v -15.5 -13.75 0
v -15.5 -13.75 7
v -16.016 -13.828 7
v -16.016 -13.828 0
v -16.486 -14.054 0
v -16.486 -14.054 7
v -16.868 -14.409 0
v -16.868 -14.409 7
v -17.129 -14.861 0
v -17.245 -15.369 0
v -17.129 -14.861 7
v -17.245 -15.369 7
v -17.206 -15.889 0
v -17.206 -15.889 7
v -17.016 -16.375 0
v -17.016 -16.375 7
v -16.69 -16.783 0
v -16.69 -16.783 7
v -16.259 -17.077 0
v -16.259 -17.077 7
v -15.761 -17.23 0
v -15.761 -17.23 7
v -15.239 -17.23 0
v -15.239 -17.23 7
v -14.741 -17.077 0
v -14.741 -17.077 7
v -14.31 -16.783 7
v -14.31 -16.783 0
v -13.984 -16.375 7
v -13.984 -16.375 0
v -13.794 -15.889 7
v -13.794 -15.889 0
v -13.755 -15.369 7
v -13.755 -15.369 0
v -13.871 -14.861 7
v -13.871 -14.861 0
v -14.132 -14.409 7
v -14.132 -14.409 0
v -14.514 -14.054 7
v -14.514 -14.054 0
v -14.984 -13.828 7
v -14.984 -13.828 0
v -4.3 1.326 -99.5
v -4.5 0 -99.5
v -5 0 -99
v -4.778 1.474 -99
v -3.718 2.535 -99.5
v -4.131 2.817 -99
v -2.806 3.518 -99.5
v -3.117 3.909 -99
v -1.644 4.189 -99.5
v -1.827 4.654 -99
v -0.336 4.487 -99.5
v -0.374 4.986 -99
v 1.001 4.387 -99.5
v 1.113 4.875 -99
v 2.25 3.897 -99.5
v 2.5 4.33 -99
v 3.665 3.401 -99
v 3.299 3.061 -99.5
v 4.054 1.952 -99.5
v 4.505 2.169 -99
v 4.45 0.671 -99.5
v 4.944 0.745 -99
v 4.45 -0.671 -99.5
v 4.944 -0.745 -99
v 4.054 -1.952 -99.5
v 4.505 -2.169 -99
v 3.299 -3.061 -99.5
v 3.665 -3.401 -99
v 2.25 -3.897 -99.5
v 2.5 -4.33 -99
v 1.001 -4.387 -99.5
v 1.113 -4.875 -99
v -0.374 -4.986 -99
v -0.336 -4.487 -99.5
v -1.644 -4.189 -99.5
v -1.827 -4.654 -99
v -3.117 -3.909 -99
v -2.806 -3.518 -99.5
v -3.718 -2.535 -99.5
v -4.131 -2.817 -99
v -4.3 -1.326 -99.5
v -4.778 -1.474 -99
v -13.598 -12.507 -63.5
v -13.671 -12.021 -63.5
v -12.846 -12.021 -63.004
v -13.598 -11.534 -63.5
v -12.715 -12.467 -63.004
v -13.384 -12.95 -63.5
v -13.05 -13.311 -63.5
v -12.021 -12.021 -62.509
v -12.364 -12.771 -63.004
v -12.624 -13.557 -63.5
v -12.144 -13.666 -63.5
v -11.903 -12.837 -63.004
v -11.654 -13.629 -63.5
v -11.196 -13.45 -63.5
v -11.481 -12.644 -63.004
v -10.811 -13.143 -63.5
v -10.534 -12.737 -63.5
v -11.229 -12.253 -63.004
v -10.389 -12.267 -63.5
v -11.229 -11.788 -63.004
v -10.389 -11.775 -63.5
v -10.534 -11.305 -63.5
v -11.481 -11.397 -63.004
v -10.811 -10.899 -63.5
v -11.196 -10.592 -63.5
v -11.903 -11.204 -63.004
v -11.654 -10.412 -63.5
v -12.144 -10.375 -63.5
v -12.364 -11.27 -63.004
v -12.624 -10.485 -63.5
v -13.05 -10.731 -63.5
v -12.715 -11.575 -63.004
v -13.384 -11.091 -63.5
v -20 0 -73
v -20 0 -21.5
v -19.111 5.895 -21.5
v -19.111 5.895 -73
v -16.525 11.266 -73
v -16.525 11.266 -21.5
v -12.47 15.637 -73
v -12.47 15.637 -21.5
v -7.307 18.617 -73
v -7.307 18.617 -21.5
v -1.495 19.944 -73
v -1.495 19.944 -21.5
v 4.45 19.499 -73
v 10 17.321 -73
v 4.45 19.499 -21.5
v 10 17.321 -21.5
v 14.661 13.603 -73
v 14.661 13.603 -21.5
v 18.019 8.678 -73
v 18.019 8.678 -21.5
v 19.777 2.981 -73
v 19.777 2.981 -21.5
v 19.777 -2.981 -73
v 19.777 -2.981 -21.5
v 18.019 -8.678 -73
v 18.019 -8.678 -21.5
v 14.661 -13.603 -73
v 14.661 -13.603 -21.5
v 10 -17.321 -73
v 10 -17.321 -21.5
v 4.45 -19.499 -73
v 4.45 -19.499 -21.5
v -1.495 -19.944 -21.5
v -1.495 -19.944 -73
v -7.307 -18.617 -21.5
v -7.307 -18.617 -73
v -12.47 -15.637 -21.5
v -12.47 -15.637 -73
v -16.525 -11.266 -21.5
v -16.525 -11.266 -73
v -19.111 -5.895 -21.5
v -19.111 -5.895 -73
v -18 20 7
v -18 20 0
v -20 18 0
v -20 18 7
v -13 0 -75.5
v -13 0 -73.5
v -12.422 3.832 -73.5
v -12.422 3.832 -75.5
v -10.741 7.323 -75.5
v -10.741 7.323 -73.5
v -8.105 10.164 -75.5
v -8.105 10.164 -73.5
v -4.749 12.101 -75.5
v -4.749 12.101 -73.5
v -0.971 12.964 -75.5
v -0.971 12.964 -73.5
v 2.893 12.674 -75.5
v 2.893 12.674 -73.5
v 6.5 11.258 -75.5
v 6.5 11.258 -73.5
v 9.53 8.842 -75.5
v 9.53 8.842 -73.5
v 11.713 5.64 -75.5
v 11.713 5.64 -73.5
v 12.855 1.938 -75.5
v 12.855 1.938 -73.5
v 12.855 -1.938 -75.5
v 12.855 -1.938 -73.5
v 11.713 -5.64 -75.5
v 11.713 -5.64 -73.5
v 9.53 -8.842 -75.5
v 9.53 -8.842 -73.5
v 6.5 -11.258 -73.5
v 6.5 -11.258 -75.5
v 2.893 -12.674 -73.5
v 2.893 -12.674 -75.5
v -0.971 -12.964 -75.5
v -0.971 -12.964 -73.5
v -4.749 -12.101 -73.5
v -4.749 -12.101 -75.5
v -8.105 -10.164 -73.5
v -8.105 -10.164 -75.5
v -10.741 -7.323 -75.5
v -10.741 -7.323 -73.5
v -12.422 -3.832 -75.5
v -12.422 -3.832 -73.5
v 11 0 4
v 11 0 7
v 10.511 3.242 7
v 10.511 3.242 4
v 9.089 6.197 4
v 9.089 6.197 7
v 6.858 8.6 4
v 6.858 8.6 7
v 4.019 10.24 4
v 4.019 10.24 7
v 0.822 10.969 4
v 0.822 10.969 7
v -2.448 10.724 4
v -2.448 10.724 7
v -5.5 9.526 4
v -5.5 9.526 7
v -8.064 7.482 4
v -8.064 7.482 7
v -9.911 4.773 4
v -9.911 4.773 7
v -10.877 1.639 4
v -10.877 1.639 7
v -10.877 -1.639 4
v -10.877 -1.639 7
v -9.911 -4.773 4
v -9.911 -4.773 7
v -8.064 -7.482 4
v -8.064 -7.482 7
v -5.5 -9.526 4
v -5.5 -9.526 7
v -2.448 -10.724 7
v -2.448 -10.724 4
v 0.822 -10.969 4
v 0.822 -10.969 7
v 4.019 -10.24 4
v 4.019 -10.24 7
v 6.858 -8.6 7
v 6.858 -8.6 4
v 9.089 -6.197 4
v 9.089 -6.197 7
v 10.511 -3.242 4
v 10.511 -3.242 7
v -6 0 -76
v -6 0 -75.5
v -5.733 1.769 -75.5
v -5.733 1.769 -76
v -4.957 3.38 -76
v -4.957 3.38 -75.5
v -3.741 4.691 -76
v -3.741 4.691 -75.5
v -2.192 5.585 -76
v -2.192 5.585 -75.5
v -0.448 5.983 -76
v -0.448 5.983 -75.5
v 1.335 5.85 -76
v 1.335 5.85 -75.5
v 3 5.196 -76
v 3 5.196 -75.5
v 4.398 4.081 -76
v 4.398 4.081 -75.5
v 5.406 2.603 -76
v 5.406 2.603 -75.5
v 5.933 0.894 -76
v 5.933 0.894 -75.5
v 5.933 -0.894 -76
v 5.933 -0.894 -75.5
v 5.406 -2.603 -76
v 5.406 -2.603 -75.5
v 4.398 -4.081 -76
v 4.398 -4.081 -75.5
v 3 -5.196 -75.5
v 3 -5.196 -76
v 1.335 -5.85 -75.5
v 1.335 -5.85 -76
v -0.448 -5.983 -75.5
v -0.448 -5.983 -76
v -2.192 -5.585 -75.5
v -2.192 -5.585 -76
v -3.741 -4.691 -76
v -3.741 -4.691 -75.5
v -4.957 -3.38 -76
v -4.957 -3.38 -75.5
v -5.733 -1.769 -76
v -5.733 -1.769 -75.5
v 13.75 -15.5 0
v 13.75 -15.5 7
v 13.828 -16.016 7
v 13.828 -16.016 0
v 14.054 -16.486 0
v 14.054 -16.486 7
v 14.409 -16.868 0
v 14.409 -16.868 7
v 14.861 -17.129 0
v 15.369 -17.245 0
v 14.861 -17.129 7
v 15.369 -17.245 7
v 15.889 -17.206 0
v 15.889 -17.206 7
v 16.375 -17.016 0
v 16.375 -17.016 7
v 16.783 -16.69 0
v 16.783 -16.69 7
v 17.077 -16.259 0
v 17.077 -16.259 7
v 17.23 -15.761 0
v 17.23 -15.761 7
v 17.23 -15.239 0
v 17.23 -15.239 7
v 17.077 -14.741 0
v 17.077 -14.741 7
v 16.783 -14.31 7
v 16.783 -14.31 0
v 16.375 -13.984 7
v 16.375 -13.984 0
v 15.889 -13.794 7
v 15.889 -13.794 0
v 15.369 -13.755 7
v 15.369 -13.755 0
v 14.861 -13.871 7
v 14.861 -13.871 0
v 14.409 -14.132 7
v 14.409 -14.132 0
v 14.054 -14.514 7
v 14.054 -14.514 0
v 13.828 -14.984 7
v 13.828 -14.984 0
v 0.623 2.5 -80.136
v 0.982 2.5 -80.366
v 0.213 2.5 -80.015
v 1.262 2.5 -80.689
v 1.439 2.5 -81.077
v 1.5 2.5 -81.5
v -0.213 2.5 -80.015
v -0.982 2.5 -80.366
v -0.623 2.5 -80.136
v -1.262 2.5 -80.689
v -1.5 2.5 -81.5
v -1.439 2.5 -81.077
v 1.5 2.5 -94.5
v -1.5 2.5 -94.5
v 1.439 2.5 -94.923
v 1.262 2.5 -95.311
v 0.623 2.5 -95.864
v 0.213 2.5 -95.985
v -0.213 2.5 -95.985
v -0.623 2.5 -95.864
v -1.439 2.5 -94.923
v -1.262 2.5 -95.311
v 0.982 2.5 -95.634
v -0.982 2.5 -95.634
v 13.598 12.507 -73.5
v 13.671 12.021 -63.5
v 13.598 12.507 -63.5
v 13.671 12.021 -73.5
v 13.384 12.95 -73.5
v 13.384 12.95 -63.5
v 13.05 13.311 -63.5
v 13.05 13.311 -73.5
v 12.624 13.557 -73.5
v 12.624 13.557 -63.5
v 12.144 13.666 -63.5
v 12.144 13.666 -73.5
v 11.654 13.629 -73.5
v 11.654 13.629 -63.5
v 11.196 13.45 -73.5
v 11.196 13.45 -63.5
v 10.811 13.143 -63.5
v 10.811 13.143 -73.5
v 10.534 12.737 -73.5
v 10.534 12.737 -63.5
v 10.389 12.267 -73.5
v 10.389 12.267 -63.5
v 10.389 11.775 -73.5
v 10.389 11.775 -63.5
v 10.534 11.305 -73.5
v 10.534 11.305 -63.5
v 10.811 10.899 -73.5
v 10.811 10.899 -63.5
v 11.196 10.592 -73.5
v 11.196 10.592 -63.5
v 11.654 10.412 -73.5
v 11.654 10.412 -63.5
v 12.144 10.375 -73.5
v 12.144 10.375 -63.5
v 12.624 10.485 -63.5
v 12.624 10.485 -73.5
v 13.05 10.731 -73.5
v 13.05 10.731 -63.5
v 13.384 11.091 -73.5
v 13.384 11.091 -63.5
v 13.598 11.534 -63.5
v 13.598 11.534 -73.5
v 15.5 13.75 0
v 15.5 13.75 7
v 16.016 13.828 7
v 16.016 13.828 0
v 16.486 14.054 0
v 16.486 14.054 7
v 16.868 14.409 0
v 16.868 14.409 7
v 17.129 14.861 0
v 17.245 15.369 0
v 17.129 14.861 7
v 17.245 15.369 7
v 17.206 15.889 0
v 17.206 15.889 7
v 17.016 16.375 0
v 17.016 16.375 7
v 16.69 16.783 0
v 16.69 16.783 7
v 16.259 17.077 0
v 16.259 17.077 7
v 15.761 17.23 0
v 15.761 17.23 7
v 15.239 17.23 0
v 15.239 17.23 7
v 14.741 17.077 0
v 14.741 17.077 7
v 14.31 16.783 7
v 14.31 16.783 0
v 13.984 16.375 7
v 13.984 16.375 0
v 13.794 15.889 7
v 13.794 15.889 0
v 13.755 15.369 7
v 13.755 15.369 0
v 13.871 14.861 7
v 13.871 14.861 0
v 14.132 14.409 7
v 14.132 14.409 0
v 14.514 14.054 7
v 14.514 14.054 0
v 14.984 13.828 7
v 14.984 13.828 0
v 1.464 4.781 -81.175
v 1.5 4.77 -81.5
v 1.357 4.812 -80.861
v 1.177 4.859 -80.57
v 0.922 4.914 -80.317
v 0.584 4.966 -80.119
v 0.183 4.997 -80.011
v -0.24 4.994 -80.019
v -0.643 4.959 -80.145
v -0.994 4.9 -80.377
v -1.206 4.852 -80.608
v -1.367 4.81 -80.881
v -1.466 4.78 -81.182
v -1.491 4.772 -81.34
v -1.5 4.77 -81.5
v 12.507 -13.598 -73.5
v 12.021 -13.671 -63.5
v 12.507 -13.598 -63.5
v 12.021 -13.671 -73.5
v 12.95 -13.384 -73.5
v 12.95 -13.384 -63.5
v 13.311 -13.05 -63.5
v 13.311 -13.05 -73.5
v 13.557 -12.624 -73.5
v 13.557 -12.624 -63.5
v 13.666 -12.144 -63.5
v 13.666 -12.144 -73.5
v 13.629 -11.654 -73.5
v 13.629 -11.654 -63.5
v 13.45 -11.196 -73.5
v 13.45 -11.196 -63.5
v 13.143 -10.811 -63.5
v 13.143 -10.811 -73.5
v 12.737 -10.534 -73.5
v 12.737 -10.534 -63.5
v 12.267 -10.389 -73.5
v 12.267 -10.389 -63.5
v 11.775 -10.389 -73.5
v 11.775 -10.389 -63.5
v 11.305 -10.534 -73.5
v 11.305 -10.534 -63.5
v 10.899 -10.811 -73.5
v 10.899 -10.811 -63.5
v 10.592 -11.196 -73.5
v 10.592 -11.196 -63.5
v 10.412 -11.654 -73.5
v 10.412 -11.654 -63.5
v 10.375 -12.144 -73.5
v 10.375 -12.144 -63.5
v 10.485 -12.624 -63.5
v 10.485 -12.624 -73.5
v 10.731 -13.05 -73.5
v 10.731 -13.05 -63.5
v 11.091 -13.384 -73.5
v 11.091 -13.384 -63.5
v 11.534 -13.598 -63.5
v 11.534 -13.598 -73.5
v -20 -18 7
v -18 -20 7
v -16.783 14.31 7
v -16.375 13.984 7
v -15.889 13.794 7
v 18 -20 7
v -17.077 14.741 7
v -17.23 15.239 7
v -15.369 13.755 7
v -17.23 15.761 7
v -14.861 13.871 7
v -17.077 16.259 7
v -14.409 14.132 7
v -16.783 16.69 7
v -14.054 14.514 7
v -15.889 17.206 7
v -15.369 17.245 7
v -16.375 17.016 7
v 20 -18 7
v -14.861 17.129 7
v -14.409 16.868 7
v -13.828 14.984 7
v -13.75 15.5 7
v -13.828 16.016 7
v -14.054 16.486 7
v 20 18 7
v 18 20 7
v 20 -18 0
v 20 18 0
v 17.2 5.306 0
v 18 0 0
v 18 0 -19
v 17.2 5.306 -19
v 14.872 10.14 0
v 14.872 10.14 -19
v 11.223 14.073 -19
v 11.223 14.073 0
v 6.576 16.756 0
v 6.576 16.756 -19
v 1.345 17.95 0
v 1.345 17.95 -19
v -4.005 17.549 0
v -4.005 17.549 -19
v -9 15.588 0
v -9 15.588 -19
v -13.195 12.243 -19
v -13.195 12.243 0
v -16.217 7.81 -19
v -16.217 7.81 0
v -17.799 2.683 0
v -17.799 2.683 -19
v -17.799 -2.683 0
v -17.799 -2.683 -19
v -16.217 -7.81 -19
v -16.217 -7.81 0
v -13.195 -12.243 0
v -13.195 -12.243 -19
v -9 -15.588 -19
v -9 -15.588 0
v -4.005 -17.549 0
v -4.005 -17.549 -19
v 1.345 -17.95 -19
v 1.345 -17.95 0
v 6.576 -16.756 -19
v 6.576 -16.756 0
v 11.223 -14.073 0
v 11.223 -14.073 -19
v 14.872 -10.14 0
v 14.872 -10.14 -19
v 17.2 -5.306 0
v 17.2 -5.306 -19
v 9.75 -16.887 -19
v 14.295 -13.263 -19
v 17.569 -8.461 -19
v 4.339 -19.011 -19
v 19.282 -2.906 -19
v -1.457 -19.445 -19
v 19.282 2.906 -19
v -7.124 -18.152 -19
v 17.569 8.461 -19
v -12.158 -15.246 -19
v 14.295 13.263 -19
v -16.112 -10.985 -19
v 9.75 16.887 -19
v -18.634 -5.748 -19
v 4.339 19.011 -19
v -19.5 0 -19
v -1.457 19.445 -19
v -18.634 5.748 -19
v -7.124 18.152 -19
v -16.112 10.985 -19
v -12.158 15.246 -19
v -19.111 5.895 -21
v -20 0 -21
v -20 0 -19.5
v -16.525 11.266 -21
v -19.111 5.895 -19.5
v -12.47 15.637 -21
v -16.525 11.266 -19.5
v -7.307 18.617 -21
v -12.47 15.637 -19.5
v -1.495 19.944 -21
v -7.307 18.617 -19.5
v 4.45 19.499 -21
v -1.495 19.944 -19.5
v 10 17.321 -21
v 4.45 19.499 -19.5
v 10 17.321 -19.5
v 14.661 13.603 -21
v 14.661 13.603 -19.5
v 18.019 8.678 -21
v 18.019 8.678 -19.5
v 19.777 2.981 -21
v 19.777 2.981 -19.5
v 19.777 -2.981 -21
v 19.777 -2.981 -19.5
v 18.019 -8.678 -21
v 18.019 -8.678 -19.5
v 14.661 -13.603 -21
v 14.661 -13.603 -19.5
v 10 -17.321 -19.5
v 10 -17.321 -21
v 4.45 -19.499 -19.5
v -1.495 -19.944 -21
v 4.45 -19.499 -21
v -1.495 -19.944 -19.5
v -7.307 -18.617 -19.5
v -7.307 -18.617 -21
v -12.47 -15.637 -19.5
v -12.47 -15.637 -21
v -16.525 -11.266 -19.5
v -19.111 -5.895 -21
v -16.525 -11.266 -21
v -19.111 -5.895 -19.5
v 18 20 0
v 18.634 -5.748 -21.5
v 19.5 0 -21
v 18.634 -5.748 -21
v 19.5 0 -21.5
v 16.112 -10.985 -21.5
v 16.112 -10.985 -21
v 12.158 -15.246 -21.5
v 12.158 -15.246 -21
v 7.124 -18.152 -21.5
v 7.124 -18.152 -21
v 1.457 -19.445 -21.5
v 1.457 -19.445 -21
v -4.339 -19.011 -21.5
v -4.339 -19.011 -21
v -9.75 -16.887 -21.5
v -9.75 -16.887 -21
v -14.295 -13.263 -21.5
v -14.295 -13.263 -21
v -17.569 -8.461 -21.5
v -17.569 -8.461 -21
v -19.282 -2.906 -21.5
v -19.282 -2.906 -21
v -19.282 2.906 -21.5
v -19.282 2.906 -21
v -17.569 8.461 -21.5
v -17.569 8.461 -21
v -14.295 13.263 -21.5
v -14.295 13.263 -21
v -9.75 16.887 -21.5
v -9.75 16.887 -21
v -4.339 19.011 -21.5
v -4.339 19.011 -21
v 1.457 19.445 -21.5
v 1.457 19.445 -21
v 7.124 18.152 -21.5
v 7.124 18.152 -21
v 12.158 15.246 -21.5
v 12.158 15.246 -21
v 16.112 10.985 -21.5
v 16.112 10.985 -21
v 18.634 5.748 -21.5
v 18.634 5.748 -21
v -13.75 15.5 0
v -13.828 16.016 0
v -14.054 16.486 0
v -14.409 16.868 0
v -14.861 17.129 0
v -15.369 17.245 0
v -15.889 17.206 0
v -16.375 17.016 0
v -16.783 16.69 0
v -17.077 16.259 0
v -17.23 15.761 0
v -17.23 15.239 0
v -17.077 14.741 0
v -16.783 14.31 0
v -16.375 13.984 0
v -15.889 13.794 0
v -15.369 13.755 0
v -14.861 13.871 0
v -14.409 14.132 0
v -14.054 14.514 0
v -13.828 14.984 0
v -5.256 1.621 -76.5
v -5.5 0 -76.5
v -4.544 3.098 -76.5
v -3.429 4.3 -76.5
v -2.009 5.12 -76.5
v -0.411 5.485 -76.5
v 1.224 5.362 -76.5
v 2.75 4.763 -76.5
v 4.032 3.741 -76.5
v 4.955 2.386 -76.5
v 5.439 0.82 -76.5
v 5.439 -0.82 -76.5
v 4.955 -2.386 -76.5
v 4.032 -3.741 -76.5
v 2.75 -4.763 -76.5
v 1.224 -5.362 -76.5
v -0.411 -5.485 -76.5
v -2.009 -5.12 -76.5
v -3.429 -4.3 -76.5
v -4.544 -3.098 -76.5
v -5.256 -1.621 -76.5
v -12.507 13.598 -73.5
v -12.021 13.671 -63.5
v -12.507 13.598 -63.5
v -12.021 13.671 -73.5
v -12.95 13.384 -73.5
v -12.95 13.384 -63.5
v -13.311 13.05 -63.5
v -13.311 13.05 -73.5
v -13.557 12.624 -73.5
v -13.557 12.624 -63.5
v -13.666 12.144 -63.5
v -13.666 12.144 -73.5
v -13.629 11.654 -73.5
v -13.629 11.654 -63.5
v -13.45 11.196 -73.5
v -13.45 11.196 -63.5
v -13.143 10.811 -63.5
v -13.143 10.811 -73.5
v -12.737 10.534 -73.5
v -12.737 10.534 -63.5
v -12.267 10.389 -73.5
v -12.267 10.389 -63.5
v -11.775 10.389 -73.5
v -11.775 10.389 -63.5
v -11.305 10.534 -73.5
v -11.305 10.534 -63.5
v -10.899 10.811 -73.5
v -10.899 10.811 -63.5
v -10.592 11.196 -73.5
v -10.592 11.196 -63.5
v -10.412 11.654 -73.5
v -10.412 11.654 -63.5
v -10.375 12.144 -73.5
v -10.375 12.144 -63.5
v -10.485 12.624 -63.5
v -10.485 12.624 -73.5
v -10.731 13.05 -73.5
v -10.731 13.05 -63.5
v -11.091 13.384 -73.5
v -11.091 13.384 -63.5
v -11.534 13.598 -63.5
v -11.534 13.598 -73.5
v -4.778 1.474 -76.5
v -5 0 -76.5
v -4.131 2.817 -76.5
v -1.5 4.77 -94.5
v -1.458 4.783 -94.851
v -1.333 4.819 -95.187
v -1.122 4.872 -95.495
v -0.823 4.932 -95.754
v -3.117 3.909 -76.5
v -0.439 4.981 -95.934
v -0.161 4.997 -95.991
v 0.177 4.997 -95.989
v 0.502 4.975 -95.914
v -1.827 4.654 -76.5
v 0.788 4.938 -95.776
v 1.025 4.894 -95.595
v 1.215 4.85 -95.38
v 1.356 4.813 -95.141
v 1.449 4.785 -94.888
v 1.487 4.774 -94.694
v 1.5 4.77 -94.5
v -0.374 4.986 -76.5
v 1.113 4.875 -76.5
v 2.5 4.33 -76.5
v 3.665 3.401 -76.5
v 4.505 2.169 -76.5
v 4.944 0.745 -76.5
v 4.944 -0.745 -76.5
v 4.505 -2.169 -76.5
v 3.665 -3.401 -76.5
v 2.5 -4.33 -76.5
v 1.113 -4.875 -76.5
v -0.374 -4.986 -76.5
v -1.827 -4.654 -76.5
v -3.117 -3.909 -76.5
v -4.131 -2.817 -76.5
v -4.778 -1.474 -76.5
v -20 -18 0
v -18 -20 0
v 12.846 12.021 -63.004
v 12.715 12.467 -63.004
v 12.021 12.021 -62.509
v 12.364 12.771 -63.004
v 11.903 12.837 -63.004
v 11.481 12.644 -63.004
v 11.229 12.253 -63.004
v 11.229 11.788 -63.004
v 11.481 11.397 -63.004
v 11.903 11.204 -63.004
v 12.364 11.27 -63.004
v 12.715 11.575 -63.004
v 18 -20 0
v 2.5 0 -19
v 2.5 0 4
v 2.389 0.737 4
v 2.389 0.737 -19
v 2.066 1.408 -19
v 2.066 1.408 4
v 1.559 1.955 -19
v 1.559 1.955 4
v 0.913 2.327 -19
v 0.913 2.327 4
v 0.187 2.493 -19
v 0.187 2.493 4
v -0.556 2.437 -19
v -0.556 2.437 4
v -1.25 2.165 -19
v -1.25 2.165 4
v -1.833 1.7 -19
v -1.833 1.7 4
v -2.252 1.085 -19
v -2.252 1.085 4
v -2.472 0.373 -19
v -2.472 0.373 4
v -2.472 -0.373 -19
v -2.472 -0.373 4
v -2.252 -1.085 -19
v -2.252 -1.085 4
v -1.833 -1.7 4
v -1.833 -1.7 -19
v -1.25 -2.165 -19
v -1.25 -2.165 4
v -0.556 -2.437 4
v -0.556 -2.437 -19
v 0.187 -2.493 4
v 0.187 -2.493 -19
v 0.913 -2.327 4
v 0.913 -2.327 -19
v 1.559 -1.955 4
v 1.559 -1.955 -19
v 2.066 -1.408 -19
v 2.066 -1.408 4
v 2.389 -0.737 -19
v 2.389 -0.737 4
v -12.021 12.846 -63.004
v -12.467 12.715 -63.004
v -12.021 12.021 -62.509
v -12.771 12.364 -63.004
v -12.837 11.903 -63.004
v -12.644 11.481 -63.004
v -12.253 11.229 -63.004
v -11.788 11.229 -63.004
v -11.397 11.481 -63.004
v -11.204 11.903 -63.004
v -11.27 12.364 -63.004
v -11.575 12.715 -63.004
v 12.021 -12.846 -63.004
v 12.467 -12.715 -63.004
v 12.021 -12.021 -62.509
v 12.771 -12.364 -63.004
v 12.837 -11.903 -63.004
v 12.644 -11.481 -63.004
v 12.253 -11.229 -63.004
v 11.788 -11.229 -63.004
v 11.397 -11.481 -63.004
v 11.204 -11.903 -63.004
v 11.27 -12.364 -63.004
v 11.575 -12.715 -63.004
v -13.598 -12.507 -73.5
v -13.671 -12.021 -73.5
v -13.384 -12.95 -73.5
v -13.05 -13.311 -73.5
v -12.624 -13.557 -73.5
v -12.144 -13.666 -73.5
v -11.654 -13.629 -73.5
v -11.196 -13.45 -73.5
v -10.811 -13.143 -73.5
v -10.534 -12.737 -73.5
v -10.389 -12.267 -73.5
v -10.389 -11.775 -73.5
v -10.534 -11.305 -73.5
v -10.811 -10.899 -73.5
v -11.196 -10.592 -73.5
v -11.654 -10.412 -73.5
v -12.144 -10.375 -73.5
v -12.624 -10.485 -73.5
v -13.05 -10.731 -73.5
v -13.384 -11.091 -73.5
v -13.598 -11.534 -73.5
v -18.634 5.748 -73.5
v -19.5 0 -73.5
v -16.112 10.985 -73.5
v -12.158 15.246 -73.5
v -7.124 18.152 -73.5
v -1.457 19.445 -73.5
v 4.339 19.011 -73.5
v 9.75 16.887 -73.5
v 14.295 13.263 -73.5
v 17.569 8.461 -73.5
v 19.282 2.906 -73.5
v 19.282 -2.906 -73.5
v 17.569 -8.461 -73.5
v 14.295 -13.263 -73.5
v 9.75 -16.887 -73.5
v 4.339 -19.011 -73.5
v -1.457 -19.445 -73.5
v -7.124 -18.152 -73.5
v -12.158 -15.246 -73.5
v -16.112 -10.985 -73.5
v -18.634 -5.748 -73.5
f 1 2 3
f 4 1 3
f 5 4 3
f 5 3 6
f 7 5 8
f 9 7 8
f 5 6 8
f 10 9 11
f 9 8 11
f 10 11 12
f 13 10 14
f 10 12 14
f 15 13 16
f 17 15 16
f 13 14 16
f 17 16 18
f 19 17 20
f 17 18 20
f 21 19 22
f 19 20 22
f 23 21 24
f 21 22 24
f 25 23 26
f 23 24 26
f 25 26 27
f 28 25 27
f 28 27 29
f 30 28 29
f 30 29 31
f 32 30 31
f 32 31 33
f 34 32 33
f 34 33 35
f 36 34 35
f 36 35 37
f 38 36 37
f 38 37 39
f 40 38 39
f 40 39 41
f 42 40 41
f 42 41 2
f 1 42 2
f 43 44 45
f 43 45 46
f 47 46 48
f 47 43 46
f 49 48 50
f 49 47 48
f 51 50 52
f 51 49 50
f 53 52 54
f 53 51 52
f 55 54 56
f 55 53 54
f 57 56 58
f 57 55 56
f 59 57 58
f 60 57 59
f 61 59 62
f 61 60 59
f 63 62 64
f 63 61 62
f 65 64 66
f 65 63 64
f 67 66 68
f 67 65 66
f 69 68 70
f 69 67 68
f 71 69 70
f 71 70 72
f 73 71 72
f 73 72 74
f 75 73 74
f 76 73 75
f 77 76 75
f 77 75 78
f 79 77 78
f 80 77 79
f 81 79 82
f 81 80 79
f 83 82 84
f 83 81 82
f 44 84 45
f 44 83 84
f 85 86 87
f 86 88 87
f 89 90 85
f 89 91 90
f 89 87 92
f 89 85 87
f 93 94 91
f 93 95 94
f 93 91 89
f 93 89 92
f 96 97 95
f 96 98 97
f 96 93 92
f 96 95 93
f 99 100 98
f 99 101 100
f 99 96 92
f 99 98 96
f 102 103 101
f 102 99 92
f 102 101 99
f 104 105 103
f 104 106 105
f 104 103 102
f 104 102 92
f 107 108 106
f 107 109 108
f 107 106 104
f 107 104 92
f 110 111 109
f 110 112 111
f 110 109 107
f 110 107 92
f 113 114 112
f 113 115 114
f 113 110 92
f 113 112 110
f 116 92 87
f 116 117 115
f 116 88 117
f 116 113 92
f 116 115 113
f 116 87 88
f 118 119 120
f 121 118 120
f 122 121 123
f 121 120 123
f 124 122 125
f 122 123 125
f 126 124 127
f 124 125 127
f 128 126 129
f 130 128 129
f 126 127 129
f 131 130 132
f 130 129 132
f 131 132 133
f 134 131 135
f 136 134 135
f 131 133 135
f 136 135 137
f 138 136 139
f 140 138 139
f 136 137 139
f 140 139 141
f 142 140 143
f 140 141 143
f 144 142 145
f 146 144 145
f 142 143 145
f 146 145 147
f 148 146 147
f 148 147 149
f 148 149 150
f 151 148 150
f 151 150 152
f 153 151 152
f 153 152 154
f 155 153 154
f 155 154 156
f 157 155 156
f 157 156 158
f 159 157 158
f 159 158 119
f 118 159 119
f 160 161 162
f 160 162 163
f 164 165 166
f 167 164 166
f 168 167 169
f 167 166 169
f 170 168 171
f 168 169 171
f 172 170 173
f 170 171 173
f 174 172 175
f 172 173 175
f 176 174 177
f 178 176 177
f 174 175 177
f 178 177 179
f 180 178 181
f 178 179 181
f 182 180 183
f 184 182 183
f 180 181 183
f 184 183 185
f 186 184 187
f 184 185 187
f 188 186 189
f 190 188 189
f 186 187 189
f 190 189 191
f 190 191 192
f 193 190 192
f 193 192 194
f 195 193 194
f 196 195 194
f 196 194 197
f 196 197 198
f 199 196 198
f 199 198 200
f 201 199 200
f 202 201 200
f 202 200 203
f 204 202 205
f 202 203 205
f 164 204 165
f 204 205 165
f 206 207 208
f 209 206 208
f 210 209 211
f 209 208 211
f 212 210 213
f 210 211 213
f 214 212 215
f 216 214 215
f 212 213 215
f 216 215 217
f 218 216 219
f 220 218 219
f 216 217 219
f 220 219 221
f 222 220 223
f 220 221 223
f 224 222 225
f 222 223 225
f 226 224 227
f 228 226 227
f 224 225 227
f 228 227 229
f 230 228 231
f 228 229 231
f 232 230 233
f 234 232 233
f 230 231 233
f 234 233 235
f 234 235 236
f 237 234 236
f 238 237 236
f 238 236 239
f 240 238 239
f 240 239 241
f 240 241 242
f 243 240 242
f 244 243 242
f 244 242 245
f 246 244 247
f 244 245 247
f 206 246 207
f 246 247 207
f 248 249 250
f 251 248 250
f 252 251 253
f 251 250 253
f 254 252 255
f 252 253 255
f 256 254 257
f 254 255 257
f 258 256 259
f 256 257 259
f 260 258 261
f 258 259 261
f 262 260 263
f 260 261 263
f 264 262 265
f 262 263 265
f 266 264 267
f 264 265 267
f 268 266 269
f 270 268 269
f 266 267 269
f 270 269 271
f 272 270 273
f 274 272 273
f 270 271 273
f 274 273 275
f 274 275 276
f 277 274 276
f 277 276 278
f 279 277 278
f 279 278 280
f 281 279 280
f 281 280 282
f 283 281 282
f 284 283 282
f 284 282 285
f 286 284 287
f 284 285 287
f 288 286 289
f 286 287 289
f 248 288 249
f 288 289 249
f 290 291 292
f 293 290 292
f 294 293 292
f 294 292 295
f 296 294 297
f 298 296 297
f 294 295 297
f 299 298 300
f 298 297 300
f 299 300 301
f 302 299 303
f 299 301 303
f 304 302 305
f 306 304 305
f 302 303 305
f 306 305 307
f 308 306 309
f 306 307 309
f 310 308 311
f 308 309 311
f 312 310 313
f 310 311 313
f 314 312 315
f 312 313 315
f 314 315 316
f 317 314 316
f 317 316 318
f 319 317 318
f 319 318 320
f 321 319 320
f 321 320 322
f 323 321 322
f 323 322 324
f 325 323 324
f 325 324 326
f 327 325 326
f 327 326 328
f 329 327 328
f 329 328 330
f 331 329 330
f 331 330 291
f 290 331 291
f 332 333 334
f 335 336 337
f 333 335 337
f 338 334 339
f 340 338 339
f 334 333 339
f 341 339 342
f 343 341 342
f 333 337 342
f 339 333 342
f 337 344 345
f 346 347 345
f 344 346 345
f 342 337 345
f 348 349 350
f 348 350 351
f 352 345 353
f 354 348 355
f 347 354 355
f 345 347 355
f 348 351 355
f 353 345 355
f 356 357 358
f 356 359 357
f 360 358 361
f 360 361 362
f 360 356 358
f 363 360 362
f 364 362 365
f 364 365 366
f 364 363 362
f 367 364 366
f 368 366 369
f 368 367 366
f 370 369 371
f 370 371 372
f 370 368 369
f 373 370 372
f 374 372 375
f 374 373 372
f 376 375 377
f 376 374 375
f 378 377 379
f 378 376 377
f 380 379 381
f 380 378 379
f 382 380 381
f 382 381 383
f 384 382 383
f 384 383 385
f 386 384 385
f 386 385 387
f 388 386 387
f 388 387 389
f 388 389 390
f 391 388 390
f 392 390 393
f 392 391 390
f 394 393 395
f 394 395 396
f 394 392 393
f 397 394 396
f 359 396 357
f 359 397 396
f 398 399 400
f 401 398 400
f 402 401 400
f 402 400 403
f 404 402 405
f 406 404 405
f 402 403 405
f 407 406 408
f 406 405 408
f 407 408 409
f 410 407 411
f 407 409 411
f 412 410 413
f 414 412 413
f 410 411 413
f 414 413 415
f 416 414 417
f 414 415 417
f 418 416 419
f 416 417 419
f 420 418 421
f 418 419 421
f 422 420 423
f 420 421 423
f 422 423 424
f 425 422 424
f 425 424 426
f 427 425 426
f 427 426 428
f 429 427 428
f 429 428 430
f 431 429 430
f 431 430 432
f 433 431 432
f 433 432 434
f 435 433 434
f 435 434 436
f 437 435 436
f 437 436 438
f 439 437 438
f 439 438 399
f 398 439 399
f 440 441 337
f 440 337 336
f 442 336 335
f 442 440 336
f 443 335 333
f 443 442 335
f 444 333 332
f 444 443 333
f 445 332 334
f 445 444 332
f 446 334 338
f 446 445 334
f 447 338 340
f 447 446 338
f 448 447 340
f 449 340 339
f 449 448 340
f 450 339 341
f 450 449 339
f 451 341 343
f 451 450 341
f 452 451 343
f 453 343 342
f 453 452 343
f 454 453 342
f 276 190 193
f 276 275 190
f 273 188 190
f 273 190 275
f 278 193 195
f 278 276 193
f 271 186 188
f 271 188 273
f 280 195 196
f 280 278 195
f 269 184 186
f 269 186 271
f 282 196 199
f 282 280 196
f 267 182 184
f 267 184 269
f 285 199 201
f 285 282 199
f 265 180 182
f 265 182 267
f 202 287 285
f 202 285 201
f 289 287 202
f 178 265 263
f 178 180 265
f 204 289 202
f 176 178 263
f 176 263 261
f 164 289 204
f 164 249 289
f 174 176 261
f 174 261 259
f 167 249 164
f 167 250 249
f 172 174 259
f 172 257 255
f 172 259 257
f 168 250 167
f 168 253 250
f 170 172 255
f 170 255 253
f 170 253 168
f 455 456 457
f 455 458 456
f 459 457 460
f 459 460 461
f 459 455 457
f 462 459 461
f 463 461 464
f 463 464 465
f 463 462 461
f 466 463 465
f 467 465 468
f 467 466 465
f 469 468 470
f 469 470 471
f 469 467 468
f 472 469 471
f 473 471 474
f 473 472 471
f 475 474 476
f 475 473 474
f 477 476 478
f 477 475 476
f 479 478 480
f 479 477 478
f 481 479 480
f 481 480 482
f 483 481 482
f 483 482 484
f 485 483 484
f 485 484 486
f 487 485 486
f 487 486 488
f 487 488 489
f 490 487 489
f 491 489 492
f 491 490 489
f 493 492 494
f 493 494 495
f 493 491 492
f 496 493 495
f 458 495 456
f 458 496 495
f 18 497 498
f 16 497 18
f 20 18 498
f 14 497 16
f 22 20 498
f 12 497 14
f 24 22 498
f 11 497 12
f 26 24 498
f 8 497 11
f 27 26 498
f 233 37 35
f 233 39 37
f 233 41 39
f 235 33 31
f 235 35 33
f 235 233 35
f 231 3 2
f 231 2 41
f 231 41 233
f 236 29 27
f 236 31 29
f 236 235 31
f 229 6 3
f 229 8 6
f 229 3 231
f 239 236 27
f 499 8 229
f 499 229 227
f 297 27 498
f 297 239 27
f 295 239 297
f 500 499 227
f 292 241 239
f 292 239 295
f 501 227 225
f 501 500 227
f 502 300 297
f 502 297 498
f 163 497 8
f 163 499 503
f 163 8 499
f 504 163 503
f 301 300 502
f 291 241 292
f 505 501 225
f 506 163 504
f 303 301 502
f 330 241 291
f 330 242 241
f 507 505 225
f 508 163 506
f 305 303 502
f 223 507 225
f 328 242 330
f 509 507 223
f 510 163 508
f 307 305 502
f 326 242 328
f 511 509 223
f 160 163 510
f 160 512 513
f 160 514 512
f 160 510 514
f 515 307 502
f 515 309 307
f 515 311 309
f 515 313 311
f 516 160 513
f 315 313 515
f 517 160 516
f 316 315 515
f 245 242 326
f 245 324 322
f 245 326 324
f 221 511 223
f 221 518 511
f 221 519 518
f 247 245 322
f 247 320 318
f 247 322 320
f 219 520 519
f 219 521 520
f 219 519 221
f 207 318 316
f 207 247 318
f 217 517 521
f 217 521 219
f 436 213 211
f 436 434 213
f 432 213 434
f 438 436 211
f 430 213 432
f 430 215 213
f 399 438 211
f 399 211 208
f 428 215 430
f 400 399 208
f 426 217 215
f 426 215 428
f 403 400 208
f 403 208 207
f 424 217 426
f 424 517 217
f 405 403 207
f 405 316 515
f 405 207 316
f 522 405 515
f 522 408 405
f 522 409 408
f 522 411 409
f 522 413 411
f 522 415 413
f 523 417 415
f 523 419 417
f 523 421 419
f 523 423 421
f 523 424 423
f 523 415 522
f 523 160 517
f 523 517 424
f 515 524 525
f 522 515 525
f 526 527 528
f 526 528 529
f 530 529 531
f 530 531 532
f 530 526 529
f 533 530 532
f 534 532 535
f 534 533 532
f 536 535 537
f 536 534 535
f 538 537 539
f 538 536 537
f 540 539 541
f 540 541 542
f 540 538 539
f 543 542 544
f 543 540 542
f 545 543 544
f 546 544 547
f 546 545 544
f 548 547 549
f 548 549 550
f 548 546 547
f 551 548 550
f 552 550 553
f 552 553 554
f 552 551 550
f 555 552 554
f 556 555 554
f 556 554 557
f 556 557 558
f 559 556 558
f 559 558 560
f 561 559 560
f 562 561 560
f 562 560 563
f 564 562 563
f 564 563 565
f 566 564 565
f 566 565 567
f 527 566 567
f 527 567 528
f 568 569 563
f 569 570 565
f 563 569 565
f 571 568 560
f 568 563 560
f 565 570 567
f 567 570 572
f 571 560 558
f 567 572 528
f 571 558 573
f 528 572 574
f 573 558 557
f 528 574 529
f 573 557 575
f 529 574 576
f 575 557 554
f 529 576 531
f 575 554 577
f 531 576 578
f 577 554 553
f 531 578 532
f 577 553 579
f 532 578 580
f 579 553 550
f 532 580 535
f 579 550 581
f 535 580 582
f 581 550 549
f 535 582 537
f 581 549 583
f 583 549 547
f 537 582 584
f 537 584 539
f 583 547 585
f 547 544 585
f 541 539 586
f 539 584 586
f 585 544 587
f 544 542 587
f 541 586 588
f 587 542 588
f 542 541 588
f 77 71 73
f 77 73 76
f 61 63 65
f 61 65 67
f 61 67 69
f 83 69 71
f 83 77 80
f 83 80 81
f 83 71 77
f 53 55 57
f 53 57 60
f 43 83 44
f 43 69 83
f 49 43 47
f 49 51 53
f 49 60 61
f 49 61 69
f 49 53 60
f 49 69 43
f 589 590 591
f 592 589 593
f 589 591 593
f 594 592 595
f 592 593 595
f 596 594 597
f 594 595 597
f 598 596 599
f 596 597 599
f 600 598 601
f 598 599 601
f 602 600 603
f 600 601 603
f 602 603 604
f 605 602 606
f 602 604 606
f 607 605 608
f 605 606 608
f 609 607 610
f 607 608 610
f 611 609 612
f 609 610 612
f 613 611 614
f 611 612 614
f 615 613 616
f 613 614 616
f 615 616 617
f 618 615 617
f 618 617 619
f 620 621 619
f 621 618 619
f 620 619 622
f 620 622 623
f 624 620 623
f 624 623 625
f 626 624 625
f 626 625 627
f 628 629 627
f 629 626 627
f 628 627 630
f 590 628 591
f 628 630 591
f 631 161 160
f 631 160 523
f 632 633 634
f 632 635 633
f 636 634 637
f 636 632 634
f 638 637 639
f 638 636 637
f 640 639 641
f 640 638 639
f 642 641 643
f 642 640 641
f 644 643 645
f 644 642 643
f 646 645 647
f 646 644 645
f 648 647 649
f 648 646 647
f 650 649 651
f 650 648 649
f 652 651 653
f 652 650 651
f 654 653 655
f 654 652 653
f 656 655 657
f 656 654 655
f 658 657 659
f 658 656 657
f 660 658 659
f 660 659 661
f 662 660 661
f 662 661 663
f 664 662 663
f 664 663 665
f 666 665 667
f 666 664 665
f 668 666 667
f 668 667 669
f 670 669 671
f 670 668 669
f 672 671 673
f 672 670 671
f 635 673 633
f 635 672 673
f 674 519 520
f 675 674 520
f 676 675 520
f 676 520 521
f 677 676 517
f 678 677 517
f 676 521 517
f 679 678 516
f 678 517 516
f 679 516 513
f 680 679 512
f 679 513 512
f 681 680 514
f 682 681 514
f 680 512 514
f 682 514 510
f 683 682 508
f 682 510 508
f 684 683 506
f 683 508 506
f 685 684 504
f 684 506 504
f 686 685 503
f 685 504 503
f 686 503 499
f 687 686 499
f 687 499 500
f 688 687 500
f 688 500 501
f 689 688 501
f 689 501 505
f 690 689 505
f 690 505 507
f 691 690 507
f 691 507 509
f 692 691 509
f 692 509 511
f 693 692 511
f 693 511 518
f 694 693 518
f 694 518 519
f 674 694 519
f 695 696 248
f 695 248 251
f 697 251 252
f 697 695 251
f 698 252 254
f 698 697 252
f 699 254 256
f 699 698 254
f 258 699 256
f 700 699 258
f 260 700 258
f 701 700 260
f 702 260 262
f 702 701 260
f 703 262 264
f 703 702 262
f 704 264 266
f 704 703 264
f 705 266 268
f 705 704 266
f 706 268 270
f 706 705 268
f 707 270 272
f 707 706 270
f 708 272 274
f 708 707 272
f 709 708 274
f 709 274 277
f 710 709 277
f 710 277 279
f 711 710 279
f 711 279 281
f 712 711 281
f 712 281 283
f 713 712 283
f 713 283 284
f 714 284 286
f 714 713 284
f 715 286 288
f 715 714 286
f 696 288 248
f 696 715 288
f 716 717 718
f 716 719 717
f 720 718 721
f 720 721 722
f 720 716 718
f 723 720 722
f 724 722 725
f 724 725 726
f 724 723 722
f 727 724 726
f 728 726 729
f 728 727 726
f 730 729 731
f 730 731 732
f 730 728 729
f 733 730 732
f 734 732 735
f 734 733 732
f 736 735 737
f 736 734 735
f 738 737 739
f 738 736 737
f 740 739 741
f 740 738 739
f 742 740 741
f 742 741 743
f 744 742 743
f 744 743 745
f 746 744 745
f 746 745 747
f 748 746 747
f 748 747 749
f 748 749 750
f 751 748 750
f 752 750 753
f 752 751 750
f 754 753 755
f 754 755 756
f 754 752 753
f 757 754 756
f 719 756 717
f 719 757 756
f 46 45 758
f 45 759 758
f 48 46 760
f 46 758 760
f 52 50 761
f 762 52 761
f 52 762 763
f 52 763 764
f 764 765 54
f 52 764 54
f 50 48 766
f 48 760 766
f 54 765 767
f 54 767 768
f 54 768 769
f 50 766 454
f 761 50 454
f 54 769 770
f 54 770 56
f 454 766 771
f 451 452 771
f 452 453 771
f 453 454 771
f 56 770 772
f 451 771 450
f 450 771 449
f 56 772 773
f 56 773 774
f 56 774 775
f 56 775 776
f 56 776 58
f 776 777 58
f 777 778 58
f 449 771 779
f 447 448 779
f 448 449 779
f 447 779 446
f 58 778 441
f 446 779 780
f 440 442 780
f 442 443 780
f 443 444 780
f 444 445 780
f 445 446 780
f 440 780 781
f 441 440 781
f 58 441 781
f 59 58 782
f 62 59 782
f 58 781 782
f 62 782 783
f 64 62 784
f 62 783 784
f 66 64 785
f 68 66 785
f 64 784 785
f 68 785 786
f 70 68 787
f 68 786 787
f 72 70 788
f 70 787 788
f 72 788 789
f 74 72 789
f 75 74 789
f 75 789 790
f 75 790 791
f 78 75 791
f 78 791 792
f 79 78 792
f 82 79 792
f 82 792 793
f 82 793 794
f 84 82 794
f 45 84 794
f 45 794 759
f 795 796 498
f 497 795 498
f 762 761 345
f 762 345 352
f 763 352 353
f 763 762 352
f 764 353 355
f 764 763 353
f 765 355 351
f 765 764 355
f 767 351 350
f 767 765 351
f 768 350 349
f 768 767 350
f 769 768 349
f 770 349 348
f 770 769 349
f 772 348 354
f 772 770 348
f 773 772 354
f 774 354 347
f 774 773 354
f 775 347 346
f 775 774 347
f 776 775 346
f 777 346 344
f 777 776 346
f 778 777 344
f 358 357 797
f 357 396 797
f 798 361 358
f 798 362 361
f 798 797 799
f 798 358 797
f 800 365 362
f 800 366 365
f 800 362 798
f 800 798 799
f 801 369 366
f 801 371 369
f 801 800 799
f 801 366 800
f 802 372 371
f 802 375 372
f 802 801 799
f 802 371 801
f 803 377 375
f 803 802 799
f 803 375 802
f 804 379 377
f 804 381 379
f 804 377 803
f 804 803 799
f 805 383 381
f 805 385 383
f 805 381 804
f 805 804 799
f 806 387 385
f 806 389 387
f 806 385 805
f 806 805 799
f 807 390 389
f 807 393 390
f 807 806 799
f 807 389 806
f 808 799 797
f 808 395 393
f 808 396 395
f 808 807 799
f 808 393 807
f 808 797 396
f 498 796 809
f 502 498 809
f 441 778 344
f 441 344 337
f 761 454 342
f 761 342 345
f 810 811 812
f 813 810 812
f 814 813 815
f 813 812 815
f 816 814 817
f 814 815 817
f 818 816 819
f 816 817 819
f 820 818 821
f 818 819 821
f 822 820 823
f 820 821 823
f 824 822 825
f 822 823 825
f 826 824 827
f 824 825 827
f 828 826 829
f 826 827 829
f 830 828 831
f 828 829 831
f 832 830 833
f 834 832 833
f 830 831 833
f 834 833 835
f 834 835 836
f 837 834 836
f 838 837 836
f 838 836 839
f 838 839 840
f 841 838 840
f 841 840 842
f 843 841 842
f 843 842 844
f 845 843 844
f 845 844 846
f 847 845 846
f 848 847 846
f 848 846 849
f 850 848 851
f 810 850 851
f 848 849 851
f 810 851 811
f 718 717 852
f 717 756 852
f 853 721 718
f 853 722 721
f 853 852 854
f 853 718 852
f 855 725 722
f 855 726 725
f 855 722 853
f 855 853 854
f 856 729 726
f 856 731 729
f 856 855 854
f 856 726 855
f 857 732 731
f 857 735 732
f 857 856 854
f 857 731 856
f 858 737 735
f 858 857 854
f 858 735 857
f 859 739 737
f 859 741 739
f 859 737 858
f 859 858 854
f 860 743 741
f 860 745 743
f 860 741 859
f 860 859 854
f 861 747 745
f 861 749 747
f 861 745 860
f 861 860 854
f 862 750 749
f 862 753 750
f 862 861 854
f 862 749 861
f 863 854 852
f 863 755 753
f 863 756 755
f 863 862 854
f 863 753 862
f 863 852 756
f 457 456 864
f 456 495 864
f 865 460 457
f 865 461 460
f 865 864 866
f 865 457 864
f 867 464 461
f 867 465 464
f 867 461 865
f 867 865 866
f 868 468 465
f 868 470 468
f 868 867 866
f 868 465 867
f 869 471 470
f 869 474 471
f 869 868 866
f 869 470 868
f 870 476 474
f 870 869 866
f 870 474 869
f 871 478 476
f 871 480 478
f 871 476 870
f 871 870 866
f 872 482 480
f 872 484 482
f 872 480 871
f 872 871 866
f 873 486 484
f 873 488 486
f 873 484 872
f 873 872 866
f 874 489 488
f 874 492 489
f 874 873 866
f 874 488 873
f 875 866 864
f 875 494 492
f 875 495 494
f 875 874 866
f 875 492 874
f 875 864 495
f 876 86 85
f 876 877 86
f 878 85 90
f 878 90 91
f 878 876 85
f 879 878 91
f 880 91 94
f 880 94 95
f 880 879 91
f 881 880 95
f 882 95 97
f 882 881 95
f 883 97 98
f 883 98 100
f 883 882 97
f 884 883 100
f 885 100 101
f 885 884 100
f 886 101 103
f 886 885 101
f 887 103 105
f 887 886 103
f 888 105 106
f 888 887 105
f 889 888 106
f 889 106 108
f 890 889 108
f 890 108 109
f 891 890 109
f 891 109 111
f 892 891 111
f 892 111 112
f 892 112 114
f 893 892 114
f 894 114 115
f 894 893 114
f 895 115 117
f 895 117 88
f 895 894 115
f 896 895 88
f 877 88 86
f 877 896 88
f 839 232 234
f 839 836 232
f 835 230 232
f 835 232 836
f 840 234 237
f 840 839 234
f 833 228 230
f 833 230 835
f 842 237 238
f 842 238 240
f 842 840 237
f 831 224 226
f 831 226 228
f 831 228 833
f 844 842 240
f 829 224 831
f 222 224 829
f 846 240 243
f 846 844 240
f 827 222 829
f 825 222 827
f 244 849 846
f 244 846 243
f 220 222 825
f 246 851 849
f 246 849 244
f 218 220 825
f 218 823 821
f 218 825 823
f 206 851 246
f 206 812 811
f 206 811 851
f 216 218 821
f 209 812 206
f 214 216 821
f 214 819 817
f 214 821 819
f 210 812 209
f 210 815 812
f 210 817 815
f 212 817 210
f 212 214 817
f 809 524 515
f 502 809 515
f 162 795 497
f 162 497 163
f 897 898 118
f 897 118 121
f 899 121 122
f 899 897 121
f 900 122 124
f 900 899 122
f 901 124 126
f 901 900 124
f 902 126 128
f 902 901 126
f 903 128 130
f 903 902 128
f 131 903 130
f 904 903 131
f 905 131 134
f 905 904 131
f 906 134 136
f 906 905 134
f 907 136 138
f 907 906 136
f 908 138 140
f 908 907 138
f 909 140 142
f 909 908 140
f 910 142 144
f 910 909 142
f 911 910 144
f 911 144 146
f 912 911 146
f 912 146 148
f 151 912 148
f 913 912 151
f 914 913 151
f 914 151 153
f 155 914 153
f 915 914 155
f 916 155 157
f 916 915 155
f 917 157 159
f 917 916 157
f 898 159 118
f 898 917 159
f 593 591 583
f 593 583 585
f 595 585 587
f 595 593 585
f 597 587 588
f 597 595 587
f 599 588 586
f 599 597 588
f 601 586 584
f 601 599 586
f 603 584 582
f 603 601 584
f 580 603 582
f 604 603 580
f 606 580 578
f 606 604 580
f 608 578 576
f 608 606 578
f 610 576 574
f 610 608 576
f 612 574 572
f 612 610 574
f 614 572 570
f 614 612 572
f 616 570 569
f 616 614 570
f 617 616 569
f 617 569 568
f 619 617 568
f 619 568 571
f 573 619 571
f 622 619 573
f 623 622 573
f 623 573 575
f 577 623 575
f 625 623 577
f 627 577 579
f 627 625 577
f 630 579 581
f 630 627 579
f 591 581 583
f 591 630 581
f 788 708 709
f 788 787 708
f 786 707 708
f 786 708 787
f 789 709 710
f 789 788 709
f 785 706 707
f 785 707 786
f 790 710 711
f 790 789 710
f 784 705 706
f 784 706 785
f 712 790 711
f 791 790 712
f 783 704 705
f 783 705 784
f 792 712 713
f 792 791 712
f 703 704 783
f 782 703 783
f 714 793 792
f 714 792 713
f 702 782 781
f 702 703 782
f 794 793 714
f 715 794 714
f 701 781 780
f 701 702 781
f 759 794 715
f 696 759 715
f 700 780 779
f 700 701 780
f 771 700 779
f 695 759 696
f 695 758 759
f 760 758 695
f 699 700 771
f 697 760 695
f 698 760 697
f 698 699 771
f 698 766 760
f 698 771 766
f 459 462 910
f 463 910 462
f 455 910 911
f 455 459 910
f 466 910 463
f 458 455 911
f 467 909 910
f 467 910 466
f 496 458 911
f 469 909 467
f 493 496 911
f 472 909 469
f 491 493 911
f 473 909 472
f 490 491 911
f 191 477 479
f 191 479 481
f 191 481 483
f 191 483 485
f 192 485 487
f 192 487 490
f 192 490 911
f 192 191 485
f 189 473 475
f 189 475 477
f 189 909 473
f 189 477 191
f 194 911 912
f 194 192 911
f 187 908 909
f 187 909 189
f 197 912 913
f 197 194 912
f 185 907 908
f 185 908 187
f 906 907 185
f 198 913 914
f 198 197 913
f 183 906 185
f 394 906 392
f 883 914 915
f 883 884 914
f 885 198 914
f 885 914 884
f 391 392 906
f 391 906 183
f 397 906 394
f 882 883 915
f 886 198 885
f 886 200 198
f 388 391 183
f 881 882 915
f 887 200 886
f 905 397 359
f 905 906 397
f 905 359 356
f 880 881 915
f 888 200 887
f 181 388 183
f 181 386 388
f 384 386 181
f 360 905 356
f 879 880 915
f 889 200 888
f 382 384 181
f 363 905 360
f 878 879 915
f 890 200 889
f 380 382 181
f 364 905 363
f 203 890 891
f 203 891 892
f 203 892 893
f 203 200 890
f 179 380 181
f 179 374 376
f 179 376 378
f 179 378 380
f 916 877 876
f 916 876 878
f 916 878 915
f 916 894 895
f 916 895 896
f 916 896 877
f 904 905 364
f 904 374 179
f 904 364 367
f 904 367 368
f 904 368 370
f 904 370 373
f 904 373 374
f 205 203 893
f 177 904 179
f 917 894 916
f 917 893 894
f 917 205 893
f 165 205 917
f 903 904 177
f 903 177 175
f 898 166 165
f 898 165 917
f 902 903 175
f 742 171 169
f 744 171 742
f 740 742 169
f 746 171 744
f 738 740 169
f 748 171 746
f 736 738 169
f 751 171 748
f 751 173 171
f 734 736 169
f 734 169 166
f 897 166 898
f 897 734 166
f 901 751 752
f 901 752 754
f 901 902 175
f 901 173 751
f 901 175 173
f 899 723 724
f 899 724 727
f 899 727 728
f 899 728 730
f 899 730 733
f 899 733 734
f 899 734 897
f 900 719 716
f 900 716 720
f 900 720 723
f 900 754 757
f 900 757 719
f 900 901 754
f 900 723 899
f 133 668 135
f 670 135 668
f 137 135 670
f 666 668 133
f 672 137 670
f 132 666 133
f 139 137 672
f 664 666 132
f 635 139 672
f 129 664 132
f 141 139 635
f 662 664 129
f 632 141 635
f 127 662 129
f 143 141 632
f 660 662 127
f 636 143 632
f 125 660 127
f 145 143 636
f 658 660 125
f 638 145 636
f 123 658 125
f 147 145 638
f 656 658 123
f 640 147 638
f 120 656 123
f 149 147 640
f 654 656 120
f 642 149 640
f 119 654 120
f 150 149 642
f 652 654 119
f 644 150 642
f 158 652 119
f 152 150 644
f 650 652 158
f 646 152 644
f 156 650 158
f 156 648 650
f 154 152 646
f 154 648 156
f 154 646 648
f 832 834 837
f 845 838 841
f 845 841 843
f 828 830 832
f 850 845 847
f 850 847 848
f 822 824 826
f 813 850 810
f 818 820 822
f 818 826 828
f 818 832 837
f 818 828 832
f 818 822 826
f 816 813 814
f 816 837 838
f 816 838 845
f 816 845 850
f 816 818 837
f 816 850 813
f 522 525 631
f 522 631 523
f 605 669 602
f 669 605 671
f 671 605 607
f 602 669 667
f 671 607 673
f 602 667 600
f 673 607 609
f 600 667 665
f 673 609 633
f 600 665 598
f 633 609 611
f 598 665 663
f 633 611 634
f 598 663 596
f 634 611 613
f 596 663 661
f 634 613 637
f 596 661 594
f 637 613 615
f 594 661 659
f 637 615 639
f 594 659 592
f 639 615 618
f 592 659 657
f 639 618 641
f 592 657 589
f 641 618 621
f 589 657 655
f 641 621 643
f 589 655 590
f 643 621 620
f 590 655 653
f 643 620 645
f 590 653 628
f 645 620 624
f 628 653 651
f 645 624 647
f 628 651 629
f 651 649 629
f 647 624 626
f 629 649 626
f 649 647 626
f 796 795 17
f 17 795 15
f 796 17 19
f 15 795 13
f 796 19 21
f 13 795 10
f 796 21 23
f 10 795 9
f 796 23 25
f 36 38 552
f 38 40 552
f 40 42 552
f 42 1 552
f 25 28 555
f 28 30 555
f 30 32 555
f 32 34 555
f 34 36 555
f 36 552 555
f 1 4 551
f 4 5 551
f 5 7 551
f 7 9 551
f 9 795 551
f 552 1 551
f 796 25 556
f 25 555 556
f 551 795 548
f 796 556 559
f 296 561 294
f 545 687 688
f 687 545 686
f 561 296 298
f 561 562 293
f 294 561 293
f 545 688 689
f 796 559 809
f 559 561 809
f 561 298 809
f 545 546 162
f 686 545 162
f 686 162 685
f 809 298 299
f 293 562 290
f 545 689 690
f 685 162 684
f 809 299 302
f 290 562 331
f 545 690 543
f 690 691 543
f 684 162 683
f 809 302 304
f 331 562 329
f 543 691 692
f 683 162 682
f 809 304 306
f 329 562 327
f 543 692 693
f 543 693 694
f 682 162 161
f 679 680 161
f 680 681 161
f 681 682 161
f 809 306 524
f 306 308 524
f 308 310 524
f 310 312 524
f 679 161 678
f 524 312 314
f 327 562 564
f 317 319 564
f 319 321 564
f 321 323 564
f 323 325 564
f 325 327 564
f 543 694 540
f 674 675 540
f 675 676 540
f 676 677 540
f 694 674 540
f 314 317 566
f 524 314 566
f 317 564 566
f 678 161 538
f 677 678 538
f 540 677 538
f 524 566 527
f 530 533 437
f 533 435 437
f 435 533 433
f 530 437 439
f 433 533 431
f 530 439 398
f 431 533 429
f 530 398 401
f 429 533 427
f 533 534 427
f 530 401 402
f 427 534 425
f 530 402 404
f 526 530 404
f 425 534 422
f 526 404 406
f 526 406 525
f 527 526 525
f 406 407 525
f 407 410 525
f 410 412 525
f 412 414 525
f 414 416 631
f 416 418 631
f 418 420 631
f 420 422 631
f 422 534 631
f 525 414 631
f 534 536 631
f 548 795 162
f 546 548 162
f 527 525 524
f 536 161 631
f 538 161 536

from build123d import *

# Parameters (mm, degrees)
SKETCH_1_W               = 40
SKETCH_1_H               = 40
EXTRUDE_1_DEPTH          = 7
SKETCH_2_R               = 18
EXTRUDE_2_DEPTH          = 26
SKETCH_3_R               = 20
EXTRUDE_3_DEPTH          = 54.5
SKETCH_4_W               = 2.306133039
SKETCH_4_H               = 0.5
SKETCH_5_R               = 13
EXTRUDE_4_DEPTH          = 2
SKETCH_6_R               = 6
EXTRUDE_5_DEPTH          = 1
SKETCH_7_R               = 5
EXTRUDE_6_DEPTH          = 23
CHAMFER_1_SIZE           = 2
CHAMFER_2_SIZE           = 0.5
SKETCH_8_R               = 1.75
CUT_EXTRUDE_1_DEPTH      = 20
PATTERN_CIRCULAR_1_COUNT = 4
SKETCH_9_R               = 11
CUT_EXTRUDE_2_DEPTH      = 3
SKETCH_10_R              = 2.5
CUT_EXTRUDE_3_DEPTH      = 23
PATTERN_CIRCULAR_2_COUNT = 4
CUT_EXTRUDE_4_DEPTH      = 2.5


with BuildPart() as part:
    # 草图1 → 凸台-拉伸1 (new body)
    with BuildSketch(Plane.XY):
        Rectangle(SKETCH_1_W, SKETCH_1_H)
    extrude(amount=EXTRUDE_1_DEPTH)

    # 草图2 → 凸台-拉伸2 (add)
    with BuildSketch(Plane.XY.offset(7)):
        Circle(SKETCH_2_R)
    extrude(amount=-EXTRUDE_2_DEPTH)

    # 草图3 → 凸台-拉伸3 (add)
    with BuildSketch(Plane(origin=(0, 0, -19), x_dir=(-1, 0, 0), z_dir=(0, 0, -1))):
        Circle(SKETCH_3_R)
    extrude(amount=EXTRUDE_3_DEPTH)

    # 草图4 → 切除-旋转1 (revolve, cut)
    with BuildSketch(Plane(origin=(0, 0, 0), x_dir=(1, 0, 0), z_dir=(0, 1, 0))):
        with Locations((20.65306652, 21.25)):
            Rectangle(SKETCH_4_W, SKETCH_4_H)
    revolve(axis=Axis((0, 0, 0), (0, 0, -1)), mode=Mode.SUBTRACT)

    # 草图5 → 凸台-拉伸4 (add)
    with BuildSketch(Plane(origin=(0, 0, -73.5), x_dir=(-1, 0, 0), z_dir=(0, 0, -1))):
        Circle(SKETCH_5_R)
    extrude(amount=EXTRUDE_4_DEPTH)

    # 草图6 → 凸台-拉伸5 (add)
    with BuildSketch(Plane(origin=(0, 0, -75.5), x_dir=(-1, 0, 0), z_dir=(0, 0, -1))):
        Circle(SKETCH_6_R)
    extrude(amount=EXTRUDE_5_DEPTH)

    # 草图7 → 凸台-拉伸6 (add)
    with BuildSketch(Plane(origin=(0, 0, -76.5), x_dir=(-1, 0, 0), z_dir=(0, 0, -1))):
        Circle(SKETCH_7_R)
    extrude(amount=EXTRUDE_6_DEPTH)

    # 倒角1
    chamfer_1_edges = [part.edges().sort_by_distance(p)[0] for p in [
        (20, -20, 3.5),
        (-20, -20, 3.5),
        (-20, 20, 3.5),
        (20, 20, 3.5),
    ]]
    chamfer(chamfer_1_edges, length=CHAMFER_1_SIZE)

    # 倒角2
    chamfer_2_edges = [part.edges().sort_by_distance(p)[0] for p in [
        (20, 0, -19),
        (20, 0, -73.5),
        (6, 0, -76.5),
        (5, 0, -99.5),
    ]]
    chamfer(chamfer_2_edges, length=CHAMFER_2_SIZE)

    # 草图8 → 切除-拉伸1 (cut)
    with BuildSketch(Plane.XY.offset(7)):
        with Locations((-15.5, 15.5)):
            Circle(SKETCH_8_R)
    cut_extrude_1 = extrude(amount=-CUT_EXTRUDE_1_DEPTH, mode=Mode.SUBTRACT)

    # 阵列(圆周)1: 切除-拉伸1 ×4 about axis
    pattern_circular_1_axis = Axis((0, 0, 0), (0, 0, 1))
    for i in range(1, PATTERN_CIRCULAR_1_COUNT):
        add(cut_extrude_1.rotate(pattern_circular_1_axis, i * 360 / PATTERN_CIRCULAR_1_COUNT), mode=Mode.SUBTRACT)

    # 草图9 → 切除-拉伸2 (cut)
    with BuildSketch(Plane.XY.offset(7)):
        Circle(SKETCH_9_R)
    extrude(amount=-CUT_EXTRUDE_2_DEPTH, mode=Mode.SUBTRACT)

    # 草图10 → 切除-拉伸3 (cut)
    with BuildSketch(Plane.XY.offset(4)):
        Circle(SKETCH_10_R)
    extrude(amount=-CUT_EXTRUDE_3_DEPTH, mode=Mode.SUBTRACT)

    # 草图11 → M4 螺纹孔1 (revolve, cut)
    with BuildSketch(Plane(origin=(-12.02081528, 12.02081528, -73.5), x_dir=(0, 1, 0), z_dir=(1, 0, 0))):
        Polygon((0, 0), (0, 10.991420021), (1.65, 10), (1.65, 0), align=None)
    hole_wizard_m4_1 = revolve(axis=Axis((-12.02081528, 12.02081528, -79.85), (0, 0, 1)), mode=Mode.SUBTRACT)

    # 阵列(圆周)2: M4 螺纹孔1 ×4 about axis
    pattern_circular_2_axis = Axis((0, 0, 0), (0, 0, 1))
    for i in range(1, PATTERN_CIRCULAR_2_COUNT):
        add(hole_wizard_m4_1.rotate(pattern_circular_2_axis, i * 360 / PATTERN_CIRCULAR_2_COUNT), mode=Mode.SUBTRACT)

    # 草图13 → 切除-拉伸4 (cut)
    with BuildSketch(Plane(origin=(0, 5, 0), x_dir=(1, 0, 0), z_dir=(0, 1, 0))):
        with BuildLine():
            Line((1.5, 94.5), (1.5, 81.5))
            ThreePointArc((1.5, 81.5), (0, 80), (-1.5, 81.5))
            Line((-1.5, 81.5), (-1.5, 94.5))
            ThreePointArc((-1.5, 94.5), (0, 96), (1.5, 94.5))
        make_face()
    extrude(amount=-CUT_EXTRUDE_4_DEPTH, mode=Mode.SUBTRACT)


solid = part.part
